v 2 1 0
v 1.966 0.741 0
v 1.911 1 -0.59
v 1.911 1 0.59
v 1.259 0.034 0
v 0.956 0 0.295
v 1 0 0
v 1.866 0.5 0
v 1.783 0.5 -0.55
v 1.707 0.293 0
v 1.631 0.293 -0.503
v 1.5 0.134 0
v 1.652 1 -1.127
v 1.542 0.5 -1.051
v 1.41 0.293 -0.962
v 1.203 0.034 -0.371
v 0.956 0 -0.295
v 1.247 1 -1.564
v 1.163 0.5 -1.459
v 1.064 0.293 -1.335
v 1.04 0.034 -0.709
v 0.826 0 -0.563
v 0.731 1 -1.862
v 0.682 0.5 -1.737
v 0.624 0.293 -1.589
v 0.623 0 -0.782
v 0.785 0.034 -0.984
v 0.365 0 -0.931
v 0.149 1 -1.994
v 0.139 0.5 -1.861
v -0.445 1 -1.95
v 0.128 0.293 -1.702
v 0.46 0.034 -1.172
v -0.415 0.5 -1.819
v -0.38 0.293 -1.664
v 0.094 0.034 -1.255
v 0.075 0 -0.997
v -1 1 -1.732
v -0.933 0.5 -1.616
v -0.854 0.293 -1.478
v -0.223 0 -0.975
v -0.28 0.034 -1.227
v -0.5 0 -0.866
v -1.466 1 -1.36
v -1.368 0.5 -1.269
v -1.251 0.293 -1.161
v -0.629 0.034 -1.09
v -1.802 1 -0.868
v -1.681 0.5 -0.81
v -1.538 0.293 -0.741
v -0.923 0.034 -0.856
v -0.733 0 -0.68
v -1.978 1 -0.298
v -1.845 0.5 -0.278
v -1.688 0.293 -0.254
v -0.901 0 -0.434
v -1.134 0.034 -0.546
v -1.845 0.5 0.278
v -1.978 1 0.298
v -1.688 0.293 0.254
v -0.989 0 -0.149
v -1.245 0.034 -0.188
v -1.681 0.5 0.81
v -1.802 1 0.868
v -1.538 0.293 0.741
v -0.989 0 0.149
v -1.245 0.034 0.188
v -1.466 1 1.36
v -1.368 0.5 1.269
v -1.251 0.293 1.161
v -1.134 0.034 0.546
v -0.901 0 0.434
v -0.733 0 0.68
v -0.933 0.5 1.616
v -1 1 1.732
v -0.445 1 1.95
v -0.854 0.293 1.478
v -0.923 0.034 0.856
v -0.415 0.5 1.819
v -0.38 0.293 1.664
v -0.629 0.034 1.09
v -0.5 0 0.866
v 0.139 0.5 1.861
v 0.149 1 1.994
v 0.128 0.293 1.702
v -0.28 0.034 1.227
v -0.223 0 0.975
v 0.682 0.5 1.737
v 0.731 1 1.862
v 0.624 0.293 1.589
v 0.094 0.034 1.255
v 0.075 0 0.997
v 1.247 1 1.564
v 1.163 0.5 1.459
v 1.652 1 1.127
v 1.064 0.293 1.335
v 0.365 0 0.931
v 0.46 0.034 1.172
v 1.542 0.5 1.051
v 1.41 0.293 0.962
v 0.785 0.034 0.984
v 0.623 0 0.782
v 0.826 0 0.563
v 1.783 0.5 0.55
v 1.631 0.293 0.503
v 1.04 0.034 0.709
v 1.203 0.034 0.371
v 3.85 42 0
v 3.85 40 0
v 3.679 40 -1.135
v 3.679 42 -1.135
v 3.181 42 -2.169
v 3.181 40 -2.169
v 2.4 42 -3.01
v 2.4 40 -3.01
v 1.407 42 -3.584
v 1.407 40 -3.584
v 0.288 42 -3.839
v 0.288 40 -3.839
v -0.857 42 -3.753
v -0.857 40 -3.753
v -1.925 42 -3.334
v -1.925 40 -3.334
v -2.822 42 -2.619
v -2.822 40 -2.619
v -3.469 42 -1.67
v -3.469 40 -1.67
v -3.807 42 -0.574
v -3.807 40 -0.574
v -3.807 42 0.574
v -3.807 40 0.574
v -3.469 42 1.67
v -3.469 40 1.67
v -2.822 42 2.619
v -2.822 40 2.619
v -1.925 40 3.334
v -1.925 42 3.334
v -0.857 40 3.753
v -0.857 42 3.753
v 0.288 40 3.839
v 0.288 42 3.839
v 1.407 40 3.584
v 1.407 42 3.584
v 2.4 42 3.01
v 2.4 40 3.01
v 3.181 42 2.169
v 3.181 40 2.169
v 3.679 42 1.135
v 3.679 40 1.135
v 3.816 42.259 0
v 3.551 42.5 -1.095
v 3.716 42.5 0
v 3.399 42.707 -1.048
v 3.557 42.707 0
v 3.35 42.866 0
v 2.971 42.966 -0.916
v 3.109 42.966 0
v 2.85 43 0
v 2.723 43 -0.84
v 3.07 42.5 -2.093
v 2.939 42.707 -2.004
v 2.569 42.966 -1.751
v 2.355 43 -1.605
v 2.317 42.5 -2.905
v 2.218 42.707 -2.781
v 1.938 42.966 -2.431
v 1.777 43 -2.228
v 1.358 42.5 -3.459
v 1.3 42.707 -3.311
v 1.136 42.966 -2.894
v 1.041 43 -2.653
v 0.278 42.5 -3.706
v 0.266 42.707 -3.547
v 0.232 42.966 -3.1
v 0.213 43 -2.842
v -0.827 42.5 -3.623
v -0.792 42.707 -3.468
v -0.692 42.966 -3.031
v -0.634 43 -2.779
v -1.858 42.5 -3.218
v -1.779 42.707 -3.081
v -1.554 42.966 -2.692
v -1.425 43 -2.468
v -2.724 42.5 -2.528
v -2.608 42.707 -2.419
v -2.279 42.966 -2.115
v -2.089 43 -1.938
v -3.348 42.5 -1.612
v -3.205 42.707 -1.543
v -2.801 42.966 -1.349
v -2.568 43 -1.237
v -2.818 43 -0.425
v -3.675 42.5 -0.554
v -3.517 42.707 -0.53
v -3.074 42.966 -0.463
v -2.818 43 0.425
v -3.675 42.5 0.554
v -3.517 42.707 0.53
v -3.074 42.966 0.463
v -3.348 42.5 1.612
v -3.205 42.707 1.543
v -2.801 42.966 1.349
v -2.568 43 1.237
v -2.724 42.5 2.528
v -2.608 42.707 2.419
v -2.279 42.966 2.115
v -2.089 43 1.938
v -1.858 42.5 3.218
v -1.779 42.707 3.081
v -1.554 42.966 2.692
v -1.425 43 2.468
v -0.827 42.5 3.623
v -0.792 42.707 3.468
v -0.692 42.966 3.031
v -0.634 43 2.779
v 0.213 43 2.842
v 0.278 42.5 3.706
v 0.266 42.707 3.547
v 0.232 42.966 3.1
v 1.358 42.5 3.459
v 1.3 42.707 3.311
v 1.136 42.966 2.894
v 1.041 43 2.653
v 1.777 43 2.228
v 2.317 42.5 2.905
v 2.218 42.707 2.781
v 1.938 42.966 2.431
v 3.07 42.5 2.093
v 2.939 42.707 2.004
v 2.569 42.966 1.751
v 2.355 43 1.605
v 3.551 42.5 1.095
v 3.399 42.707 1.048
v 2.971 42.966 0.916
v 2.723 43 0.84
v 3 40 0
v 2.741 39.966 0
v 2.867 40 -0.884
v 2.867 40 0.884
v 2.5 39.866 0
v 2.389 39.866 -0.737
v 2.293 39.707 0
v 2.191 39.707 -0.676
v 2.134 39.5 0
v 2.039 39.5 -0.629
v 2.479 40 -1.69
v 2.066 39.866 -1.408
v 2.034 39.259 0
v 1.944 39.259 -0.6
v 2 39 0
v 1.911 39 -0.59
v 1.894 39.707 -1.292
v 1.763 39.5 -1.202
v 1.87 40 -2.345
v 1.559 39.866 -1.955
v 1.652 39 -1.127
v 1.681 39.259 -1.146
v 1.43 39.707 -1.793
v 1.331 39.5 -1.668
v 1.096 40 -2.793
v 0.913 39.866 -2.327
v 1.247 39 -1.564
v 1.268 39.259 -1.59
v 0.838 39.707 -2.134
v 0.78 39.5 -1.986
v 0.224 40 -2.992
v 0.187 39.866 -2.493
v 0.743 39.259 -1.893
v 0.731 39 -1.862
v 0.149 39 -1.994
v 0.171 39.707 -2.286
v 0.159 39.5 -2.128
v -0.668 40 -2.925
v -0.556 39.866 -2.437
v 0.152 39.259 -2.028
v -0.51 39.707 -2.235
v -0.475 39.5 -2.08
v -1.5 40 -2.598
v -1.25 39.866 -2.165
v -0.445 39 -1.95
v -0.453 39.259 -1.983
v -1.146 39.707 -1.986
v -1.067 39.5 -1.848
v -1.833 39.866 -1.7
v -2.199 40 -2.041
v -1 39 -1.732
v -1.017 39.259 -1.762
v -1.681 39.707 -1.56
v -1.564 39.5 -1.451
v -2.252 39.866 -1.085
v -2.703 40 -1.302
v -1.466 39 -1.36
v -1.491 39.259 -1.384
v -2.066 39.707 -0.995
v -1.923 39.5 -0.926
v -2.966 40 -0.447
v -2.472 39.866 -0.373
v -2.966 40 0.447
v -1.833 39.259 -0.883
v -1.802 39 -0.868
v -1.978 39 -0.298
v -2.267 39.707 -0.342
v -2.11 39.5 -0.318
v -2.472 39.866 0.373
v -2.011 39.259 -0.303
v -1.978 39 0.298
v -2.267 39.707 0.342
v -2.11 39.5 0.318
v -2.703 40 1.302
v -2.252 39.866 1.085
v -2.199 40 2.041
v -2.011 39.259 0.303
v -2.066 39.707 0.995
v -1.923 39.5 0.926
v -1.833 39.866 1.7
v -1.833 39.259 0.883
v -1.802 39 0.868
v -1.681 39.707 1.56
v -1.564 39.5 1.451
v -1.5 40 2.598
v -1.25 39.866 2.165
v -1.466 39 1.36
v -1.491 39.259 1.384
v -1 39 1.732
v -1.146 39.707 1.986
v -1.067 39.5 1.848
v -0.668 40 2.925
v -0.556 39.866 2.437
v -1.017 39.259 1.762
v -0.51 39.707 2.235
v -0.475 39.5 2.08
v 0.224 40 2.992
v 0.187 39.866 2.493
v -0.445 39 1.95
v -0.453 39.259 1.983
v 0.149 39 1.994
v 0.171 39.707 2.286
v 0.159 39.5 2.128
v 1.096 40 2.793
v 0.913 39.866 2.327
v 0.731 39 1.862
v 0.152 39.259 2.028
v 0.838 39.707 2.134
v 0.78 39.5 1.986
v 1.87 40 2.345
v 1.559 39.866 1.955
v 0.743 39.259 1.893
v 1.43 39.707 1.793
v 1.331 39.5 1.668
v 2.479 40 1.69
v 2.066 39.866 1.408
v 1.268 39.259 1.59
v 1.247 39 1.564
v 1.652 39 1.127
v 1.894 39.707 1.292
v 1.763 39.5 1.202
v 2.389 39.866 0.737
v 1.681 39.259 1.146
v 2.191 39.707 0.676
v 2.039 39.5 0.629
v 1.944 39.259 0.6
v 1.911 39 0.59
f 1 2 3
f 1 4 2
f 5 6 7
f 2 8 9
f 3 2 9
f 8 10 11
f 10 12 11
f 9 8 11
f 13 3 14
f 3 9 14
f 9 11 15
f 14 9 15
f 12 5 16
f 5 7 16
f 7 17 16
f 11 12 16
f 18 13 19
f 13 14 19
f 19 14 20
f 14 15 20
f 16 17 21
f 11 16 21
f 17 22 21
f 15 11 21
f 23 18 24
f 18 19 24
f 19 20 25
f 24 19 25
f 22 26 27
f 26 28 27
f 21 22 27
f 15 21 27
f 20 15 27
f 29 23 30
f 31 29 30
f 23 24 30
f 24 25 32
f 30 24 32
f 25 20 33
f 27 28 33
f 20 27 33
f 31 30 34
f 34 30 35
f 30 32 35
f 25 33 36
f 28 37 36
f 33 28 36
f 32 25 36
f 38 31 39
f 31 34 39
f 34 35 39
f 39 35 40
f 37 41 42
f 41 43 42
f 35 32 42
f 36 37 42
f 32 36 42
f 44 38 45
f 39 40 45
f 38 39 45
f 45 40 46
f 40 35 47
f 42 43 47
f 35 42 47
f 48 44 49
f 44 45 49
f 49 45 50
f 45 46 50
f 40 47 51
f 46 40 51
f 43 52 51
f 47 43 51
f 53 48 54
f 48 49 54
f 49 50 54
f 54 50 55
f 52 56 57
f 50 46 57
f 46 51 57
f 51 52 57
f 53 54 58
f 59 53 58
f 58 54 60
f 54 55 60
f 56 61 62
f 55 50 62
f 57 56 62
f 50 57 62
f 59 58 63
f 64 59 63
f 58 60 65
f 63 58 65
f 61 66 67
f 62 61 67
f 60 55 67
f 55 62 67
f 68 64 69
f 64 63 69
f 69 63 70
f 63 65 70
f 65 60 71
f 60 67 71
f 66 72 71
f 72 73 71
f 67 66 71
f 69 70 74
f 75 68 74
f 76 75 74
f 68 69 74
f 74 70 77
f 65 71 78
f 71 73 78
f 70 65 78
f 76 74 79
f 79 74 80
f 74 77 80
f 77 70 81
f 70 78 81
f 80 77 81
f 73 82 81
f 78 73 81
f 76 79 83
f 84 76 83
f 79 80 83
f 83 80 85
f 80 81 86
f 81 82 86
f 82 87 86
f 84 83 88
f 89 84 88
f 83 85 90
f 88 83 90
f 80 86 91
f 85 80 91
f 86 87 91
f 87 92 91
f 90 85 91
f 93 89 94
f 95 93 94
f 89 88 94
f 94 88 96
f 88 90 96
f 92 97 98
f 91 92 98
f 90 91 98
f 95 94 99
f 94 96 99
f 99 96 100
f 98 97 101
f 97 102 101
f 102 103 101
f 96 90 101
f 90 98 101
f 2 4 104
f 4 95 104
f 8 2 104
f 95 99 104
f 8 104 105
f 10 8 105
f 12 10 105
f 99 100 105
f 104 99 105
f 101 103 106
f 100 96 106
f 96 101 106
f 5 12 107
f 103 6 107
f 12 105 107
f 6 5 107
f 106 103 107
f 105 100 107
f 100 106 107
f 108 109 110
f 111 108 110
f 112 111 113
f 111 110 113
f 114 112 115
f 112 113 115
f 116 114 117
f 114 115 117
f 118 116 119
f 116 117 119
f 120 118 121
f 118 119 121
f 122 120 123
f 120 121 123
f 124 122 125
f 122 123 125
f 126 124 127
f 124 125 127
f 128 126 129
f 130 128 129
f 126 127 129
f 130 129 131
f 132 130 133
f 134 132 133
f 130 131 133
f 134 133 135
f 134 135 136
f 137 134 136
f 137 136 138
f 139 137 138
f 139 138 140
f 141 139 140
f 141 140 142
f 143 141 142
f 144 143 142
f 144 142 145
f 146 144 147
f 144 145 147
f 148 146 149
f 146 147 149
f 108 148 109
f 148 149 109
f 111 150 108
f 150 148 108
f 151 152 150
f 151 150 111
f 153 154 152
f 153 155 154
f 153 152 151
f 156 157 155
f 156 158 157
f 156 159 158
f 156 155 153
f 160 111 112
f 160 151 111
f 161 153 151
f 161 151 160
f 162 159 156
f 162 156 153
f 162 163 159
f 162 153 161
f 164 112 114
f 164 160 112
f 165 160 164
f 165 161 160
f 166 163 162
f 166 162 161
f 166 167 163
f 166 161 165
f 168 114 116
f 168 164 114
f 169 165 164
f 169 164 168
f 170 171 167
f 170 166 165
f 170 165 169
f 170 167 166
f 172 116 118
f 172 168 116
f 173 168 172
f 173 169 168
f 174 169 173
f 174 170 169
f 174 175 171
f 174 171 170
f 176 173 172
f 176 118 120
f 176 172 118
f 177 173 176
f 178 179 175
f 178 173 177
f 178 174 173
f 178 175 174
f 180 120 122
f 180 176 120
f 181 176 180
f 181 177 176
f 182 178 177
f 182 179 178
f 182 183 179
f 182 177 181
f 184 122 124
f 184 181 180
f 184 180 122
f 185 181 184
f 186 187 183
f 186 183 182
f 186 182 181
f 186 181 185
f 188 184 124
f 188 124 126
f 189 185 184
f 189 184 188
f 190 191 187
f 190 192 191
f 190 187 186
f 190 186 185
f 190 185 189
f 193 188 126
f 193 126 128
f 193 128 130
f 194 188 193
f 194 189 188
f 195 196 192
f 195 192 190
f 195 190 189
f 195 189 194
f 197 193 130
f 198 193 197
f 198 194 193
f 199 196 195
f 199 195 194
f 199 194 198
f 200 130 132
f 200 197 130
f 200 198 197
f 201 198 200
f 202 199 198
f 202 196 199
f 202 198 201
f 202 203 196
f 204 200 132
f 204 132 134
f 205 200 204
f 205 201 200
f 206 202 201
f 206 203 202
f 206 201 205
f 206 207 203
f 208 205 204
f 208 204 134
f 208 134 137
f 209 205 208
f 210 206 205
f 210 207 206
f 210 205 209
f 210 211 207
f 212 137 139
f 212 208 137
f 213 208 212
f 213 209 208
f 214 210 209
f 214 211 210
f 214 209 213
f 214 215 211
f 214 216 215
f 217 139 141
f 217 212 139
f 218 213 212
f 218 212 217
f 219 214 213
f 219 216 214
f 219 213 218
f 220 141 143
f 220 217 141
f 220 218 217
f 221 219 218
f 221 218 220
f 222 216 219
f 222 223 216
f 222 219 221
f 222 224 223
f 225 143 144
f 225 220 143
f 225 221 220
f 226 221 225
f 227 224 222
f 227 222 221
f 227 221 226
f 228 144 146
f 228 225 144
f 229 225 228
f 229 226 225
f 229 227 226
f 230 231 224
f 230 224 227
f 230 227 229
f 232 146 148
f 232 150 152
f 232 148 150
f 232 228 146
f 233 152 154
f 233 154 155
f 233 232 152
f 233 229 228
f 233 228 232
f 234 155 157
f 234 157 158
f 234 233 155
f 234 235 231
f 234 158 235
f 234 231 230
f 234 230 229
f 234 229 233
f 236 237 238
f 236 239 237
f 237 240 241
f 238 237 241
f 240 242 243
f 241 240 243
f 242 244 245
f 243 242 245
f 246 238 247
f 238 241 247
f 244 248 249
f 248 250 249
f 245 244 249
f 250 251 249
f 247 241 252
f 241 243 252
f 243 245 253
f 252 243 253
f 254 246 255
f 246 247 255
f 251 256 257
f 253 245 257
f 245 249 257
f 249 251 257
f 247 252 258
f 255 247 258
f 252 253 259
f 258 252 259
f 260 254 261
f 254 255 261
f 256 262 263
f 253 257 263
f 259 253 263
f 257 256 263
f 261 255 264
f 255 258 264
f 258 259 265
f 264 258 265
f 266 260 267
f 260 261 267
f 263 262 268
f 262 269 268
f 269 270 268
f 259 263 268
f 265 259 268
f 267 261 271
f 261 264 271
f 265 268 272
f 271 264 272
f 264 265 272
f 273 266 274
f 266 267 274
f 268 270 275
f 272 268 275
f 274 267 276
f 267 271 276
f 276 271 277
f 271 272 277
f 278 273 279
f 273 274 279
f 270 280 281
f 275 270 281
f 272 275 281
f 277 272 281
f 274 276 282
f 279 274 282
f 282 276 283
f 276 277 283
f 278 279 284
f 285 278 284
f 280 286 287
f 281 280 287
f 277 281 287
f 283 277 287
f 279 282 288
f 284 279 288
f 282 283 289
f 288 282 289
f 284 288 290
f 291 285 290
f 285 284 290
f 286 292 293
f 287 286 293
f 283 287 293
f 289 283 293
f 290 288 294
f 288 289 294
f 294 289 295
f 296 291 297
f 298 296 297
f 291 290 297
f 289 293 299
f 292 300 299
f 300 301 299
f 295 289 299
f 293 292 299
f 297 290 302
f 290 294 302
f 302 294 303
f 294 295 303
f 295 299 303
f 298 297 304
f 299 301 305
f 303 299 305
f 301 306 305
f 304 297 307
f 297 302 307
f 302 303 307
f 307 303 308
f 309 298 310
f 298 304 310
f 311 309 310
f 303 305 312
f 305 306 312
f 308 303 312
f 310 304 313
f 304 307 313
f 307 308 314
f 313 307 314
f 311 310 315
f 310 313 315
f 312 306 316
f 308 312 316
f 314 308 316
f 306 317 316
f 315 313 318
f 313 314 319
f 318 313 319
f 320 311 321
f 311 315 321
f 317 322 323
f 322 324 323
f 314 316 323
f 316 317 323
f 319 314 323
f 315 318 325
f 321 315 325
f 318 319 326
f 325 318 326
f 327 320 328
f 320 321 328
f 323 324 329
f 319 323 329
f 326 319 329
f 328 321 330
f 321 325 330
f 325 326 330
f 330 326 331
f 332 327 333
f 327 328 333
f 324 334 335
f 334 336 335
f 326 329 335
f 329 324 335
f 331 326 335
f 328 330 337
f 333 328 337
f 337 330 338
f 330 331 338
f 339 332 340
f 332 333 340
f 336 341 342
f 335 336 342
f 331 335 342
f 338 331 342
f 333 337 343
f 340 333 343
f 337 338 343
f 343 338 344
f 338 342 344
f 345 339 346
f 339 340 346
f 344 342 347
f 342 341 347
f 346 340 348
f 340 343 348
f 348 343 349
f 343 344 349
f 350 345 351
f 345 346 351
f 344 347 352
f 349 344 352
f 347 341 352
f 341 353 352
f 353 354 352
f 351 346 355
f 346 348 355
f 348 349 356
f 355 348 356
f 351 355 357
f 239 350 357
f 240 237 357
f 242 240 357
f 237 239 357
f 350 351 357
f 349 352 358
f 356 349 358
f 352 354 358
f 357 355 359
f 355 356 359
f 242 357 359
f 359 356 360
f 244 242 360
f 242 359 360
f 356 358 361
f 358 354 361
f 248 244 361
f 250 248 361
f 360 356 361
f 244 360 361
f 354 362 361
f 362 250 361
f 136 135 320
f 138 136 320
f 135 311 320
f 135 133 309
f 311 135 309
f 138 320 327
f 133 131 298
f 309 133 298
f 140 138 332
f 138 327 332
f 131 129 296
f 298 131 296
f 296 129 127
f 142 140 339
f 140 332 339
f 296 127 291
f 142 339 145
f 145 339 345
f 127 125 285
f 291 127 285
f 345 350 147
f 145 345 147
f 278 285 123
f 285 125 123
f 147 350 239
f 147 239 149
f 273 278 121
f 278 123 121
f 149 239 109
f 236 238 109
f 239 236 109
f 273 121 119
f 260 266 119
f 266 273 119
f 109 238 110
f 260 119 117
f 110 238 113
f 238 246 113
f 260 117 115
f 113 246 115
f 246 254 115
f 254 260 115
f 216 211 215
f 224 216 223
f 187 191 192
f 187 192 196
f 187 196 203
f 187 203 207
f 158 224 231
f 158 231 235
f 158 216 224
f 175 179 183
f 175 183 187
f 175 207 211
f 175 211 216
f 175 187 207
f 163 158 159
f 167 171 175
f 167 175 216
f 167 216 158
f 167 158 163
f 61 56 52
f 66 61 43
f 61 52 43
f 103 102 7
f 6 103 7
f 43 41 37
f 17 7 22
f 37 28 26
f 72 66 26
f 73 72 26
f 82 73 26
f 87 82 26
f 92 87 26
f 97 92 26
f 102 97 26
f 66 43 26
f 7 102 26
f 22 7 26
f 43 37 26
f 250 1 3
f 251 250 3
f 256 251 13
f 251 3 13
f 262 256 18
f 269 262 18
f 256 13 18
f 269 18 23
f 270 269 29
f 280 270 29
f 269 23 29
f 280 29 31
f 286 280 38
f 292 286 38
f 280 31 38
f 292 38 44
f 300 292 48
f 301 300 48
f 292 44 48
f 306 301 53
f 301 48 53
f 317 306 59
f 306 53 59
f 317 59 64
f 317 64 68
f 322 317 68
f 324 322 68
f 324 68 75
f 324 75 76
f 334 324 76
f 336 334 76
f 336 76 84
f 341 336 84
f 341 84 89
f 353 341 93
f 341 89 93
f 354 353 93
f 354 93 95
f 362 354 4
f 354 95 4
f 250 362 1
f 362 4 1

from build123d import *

# Parameters (mm, degrees)
SKETCH1_R           = 2
BOSS_EXTRUDE1_DEPTH = 40
SKETCH2_R           = 3.85
BOSS_EXTRUDE2_DEPTH = 3
FILLET1_R           = 1
FILLET2_R           = 1


with BuildPart() as part:
    # Sketch1 → Boss-Extrude1 (new body)
    with BuildSketch(Plane(origin=(0, 0, 0), x_dir=(1, 0, 0), z_dir=(0, 1, 0))):
        Circle(SKETCH1_R)
    extrude(amount=BOSS_EXTRUDE1_DEPTH)

    # Sketch2 → Boss-Extrude2 (add)
    with BuildSketch(Plane(origin=(0, 40, 0), x_dir=(1, 0, 0), z_dir=(0, 1, 0))):
        Circle(SKETCH2_R)
    extrude(amount=BOSS_EXTRUDE2_DEPTH)

    # Fillet1
    fillet1_edges = [part.edges().sort_by_distance(p)[0] for p in [
        (-3.85, 43, 0),
    ]]
    fillet(fillet1_edges, radius=FILLET1_R)

    # Fillet2
    fillet2_edges = [part.edges().sort_by_distance(p)[0] for p in [
        (-2, 0, 0),
        (-2, 40, 0),
    ]]
    fillet(fillet2_edges, radius=FILLET2_R)


solid = part.part
